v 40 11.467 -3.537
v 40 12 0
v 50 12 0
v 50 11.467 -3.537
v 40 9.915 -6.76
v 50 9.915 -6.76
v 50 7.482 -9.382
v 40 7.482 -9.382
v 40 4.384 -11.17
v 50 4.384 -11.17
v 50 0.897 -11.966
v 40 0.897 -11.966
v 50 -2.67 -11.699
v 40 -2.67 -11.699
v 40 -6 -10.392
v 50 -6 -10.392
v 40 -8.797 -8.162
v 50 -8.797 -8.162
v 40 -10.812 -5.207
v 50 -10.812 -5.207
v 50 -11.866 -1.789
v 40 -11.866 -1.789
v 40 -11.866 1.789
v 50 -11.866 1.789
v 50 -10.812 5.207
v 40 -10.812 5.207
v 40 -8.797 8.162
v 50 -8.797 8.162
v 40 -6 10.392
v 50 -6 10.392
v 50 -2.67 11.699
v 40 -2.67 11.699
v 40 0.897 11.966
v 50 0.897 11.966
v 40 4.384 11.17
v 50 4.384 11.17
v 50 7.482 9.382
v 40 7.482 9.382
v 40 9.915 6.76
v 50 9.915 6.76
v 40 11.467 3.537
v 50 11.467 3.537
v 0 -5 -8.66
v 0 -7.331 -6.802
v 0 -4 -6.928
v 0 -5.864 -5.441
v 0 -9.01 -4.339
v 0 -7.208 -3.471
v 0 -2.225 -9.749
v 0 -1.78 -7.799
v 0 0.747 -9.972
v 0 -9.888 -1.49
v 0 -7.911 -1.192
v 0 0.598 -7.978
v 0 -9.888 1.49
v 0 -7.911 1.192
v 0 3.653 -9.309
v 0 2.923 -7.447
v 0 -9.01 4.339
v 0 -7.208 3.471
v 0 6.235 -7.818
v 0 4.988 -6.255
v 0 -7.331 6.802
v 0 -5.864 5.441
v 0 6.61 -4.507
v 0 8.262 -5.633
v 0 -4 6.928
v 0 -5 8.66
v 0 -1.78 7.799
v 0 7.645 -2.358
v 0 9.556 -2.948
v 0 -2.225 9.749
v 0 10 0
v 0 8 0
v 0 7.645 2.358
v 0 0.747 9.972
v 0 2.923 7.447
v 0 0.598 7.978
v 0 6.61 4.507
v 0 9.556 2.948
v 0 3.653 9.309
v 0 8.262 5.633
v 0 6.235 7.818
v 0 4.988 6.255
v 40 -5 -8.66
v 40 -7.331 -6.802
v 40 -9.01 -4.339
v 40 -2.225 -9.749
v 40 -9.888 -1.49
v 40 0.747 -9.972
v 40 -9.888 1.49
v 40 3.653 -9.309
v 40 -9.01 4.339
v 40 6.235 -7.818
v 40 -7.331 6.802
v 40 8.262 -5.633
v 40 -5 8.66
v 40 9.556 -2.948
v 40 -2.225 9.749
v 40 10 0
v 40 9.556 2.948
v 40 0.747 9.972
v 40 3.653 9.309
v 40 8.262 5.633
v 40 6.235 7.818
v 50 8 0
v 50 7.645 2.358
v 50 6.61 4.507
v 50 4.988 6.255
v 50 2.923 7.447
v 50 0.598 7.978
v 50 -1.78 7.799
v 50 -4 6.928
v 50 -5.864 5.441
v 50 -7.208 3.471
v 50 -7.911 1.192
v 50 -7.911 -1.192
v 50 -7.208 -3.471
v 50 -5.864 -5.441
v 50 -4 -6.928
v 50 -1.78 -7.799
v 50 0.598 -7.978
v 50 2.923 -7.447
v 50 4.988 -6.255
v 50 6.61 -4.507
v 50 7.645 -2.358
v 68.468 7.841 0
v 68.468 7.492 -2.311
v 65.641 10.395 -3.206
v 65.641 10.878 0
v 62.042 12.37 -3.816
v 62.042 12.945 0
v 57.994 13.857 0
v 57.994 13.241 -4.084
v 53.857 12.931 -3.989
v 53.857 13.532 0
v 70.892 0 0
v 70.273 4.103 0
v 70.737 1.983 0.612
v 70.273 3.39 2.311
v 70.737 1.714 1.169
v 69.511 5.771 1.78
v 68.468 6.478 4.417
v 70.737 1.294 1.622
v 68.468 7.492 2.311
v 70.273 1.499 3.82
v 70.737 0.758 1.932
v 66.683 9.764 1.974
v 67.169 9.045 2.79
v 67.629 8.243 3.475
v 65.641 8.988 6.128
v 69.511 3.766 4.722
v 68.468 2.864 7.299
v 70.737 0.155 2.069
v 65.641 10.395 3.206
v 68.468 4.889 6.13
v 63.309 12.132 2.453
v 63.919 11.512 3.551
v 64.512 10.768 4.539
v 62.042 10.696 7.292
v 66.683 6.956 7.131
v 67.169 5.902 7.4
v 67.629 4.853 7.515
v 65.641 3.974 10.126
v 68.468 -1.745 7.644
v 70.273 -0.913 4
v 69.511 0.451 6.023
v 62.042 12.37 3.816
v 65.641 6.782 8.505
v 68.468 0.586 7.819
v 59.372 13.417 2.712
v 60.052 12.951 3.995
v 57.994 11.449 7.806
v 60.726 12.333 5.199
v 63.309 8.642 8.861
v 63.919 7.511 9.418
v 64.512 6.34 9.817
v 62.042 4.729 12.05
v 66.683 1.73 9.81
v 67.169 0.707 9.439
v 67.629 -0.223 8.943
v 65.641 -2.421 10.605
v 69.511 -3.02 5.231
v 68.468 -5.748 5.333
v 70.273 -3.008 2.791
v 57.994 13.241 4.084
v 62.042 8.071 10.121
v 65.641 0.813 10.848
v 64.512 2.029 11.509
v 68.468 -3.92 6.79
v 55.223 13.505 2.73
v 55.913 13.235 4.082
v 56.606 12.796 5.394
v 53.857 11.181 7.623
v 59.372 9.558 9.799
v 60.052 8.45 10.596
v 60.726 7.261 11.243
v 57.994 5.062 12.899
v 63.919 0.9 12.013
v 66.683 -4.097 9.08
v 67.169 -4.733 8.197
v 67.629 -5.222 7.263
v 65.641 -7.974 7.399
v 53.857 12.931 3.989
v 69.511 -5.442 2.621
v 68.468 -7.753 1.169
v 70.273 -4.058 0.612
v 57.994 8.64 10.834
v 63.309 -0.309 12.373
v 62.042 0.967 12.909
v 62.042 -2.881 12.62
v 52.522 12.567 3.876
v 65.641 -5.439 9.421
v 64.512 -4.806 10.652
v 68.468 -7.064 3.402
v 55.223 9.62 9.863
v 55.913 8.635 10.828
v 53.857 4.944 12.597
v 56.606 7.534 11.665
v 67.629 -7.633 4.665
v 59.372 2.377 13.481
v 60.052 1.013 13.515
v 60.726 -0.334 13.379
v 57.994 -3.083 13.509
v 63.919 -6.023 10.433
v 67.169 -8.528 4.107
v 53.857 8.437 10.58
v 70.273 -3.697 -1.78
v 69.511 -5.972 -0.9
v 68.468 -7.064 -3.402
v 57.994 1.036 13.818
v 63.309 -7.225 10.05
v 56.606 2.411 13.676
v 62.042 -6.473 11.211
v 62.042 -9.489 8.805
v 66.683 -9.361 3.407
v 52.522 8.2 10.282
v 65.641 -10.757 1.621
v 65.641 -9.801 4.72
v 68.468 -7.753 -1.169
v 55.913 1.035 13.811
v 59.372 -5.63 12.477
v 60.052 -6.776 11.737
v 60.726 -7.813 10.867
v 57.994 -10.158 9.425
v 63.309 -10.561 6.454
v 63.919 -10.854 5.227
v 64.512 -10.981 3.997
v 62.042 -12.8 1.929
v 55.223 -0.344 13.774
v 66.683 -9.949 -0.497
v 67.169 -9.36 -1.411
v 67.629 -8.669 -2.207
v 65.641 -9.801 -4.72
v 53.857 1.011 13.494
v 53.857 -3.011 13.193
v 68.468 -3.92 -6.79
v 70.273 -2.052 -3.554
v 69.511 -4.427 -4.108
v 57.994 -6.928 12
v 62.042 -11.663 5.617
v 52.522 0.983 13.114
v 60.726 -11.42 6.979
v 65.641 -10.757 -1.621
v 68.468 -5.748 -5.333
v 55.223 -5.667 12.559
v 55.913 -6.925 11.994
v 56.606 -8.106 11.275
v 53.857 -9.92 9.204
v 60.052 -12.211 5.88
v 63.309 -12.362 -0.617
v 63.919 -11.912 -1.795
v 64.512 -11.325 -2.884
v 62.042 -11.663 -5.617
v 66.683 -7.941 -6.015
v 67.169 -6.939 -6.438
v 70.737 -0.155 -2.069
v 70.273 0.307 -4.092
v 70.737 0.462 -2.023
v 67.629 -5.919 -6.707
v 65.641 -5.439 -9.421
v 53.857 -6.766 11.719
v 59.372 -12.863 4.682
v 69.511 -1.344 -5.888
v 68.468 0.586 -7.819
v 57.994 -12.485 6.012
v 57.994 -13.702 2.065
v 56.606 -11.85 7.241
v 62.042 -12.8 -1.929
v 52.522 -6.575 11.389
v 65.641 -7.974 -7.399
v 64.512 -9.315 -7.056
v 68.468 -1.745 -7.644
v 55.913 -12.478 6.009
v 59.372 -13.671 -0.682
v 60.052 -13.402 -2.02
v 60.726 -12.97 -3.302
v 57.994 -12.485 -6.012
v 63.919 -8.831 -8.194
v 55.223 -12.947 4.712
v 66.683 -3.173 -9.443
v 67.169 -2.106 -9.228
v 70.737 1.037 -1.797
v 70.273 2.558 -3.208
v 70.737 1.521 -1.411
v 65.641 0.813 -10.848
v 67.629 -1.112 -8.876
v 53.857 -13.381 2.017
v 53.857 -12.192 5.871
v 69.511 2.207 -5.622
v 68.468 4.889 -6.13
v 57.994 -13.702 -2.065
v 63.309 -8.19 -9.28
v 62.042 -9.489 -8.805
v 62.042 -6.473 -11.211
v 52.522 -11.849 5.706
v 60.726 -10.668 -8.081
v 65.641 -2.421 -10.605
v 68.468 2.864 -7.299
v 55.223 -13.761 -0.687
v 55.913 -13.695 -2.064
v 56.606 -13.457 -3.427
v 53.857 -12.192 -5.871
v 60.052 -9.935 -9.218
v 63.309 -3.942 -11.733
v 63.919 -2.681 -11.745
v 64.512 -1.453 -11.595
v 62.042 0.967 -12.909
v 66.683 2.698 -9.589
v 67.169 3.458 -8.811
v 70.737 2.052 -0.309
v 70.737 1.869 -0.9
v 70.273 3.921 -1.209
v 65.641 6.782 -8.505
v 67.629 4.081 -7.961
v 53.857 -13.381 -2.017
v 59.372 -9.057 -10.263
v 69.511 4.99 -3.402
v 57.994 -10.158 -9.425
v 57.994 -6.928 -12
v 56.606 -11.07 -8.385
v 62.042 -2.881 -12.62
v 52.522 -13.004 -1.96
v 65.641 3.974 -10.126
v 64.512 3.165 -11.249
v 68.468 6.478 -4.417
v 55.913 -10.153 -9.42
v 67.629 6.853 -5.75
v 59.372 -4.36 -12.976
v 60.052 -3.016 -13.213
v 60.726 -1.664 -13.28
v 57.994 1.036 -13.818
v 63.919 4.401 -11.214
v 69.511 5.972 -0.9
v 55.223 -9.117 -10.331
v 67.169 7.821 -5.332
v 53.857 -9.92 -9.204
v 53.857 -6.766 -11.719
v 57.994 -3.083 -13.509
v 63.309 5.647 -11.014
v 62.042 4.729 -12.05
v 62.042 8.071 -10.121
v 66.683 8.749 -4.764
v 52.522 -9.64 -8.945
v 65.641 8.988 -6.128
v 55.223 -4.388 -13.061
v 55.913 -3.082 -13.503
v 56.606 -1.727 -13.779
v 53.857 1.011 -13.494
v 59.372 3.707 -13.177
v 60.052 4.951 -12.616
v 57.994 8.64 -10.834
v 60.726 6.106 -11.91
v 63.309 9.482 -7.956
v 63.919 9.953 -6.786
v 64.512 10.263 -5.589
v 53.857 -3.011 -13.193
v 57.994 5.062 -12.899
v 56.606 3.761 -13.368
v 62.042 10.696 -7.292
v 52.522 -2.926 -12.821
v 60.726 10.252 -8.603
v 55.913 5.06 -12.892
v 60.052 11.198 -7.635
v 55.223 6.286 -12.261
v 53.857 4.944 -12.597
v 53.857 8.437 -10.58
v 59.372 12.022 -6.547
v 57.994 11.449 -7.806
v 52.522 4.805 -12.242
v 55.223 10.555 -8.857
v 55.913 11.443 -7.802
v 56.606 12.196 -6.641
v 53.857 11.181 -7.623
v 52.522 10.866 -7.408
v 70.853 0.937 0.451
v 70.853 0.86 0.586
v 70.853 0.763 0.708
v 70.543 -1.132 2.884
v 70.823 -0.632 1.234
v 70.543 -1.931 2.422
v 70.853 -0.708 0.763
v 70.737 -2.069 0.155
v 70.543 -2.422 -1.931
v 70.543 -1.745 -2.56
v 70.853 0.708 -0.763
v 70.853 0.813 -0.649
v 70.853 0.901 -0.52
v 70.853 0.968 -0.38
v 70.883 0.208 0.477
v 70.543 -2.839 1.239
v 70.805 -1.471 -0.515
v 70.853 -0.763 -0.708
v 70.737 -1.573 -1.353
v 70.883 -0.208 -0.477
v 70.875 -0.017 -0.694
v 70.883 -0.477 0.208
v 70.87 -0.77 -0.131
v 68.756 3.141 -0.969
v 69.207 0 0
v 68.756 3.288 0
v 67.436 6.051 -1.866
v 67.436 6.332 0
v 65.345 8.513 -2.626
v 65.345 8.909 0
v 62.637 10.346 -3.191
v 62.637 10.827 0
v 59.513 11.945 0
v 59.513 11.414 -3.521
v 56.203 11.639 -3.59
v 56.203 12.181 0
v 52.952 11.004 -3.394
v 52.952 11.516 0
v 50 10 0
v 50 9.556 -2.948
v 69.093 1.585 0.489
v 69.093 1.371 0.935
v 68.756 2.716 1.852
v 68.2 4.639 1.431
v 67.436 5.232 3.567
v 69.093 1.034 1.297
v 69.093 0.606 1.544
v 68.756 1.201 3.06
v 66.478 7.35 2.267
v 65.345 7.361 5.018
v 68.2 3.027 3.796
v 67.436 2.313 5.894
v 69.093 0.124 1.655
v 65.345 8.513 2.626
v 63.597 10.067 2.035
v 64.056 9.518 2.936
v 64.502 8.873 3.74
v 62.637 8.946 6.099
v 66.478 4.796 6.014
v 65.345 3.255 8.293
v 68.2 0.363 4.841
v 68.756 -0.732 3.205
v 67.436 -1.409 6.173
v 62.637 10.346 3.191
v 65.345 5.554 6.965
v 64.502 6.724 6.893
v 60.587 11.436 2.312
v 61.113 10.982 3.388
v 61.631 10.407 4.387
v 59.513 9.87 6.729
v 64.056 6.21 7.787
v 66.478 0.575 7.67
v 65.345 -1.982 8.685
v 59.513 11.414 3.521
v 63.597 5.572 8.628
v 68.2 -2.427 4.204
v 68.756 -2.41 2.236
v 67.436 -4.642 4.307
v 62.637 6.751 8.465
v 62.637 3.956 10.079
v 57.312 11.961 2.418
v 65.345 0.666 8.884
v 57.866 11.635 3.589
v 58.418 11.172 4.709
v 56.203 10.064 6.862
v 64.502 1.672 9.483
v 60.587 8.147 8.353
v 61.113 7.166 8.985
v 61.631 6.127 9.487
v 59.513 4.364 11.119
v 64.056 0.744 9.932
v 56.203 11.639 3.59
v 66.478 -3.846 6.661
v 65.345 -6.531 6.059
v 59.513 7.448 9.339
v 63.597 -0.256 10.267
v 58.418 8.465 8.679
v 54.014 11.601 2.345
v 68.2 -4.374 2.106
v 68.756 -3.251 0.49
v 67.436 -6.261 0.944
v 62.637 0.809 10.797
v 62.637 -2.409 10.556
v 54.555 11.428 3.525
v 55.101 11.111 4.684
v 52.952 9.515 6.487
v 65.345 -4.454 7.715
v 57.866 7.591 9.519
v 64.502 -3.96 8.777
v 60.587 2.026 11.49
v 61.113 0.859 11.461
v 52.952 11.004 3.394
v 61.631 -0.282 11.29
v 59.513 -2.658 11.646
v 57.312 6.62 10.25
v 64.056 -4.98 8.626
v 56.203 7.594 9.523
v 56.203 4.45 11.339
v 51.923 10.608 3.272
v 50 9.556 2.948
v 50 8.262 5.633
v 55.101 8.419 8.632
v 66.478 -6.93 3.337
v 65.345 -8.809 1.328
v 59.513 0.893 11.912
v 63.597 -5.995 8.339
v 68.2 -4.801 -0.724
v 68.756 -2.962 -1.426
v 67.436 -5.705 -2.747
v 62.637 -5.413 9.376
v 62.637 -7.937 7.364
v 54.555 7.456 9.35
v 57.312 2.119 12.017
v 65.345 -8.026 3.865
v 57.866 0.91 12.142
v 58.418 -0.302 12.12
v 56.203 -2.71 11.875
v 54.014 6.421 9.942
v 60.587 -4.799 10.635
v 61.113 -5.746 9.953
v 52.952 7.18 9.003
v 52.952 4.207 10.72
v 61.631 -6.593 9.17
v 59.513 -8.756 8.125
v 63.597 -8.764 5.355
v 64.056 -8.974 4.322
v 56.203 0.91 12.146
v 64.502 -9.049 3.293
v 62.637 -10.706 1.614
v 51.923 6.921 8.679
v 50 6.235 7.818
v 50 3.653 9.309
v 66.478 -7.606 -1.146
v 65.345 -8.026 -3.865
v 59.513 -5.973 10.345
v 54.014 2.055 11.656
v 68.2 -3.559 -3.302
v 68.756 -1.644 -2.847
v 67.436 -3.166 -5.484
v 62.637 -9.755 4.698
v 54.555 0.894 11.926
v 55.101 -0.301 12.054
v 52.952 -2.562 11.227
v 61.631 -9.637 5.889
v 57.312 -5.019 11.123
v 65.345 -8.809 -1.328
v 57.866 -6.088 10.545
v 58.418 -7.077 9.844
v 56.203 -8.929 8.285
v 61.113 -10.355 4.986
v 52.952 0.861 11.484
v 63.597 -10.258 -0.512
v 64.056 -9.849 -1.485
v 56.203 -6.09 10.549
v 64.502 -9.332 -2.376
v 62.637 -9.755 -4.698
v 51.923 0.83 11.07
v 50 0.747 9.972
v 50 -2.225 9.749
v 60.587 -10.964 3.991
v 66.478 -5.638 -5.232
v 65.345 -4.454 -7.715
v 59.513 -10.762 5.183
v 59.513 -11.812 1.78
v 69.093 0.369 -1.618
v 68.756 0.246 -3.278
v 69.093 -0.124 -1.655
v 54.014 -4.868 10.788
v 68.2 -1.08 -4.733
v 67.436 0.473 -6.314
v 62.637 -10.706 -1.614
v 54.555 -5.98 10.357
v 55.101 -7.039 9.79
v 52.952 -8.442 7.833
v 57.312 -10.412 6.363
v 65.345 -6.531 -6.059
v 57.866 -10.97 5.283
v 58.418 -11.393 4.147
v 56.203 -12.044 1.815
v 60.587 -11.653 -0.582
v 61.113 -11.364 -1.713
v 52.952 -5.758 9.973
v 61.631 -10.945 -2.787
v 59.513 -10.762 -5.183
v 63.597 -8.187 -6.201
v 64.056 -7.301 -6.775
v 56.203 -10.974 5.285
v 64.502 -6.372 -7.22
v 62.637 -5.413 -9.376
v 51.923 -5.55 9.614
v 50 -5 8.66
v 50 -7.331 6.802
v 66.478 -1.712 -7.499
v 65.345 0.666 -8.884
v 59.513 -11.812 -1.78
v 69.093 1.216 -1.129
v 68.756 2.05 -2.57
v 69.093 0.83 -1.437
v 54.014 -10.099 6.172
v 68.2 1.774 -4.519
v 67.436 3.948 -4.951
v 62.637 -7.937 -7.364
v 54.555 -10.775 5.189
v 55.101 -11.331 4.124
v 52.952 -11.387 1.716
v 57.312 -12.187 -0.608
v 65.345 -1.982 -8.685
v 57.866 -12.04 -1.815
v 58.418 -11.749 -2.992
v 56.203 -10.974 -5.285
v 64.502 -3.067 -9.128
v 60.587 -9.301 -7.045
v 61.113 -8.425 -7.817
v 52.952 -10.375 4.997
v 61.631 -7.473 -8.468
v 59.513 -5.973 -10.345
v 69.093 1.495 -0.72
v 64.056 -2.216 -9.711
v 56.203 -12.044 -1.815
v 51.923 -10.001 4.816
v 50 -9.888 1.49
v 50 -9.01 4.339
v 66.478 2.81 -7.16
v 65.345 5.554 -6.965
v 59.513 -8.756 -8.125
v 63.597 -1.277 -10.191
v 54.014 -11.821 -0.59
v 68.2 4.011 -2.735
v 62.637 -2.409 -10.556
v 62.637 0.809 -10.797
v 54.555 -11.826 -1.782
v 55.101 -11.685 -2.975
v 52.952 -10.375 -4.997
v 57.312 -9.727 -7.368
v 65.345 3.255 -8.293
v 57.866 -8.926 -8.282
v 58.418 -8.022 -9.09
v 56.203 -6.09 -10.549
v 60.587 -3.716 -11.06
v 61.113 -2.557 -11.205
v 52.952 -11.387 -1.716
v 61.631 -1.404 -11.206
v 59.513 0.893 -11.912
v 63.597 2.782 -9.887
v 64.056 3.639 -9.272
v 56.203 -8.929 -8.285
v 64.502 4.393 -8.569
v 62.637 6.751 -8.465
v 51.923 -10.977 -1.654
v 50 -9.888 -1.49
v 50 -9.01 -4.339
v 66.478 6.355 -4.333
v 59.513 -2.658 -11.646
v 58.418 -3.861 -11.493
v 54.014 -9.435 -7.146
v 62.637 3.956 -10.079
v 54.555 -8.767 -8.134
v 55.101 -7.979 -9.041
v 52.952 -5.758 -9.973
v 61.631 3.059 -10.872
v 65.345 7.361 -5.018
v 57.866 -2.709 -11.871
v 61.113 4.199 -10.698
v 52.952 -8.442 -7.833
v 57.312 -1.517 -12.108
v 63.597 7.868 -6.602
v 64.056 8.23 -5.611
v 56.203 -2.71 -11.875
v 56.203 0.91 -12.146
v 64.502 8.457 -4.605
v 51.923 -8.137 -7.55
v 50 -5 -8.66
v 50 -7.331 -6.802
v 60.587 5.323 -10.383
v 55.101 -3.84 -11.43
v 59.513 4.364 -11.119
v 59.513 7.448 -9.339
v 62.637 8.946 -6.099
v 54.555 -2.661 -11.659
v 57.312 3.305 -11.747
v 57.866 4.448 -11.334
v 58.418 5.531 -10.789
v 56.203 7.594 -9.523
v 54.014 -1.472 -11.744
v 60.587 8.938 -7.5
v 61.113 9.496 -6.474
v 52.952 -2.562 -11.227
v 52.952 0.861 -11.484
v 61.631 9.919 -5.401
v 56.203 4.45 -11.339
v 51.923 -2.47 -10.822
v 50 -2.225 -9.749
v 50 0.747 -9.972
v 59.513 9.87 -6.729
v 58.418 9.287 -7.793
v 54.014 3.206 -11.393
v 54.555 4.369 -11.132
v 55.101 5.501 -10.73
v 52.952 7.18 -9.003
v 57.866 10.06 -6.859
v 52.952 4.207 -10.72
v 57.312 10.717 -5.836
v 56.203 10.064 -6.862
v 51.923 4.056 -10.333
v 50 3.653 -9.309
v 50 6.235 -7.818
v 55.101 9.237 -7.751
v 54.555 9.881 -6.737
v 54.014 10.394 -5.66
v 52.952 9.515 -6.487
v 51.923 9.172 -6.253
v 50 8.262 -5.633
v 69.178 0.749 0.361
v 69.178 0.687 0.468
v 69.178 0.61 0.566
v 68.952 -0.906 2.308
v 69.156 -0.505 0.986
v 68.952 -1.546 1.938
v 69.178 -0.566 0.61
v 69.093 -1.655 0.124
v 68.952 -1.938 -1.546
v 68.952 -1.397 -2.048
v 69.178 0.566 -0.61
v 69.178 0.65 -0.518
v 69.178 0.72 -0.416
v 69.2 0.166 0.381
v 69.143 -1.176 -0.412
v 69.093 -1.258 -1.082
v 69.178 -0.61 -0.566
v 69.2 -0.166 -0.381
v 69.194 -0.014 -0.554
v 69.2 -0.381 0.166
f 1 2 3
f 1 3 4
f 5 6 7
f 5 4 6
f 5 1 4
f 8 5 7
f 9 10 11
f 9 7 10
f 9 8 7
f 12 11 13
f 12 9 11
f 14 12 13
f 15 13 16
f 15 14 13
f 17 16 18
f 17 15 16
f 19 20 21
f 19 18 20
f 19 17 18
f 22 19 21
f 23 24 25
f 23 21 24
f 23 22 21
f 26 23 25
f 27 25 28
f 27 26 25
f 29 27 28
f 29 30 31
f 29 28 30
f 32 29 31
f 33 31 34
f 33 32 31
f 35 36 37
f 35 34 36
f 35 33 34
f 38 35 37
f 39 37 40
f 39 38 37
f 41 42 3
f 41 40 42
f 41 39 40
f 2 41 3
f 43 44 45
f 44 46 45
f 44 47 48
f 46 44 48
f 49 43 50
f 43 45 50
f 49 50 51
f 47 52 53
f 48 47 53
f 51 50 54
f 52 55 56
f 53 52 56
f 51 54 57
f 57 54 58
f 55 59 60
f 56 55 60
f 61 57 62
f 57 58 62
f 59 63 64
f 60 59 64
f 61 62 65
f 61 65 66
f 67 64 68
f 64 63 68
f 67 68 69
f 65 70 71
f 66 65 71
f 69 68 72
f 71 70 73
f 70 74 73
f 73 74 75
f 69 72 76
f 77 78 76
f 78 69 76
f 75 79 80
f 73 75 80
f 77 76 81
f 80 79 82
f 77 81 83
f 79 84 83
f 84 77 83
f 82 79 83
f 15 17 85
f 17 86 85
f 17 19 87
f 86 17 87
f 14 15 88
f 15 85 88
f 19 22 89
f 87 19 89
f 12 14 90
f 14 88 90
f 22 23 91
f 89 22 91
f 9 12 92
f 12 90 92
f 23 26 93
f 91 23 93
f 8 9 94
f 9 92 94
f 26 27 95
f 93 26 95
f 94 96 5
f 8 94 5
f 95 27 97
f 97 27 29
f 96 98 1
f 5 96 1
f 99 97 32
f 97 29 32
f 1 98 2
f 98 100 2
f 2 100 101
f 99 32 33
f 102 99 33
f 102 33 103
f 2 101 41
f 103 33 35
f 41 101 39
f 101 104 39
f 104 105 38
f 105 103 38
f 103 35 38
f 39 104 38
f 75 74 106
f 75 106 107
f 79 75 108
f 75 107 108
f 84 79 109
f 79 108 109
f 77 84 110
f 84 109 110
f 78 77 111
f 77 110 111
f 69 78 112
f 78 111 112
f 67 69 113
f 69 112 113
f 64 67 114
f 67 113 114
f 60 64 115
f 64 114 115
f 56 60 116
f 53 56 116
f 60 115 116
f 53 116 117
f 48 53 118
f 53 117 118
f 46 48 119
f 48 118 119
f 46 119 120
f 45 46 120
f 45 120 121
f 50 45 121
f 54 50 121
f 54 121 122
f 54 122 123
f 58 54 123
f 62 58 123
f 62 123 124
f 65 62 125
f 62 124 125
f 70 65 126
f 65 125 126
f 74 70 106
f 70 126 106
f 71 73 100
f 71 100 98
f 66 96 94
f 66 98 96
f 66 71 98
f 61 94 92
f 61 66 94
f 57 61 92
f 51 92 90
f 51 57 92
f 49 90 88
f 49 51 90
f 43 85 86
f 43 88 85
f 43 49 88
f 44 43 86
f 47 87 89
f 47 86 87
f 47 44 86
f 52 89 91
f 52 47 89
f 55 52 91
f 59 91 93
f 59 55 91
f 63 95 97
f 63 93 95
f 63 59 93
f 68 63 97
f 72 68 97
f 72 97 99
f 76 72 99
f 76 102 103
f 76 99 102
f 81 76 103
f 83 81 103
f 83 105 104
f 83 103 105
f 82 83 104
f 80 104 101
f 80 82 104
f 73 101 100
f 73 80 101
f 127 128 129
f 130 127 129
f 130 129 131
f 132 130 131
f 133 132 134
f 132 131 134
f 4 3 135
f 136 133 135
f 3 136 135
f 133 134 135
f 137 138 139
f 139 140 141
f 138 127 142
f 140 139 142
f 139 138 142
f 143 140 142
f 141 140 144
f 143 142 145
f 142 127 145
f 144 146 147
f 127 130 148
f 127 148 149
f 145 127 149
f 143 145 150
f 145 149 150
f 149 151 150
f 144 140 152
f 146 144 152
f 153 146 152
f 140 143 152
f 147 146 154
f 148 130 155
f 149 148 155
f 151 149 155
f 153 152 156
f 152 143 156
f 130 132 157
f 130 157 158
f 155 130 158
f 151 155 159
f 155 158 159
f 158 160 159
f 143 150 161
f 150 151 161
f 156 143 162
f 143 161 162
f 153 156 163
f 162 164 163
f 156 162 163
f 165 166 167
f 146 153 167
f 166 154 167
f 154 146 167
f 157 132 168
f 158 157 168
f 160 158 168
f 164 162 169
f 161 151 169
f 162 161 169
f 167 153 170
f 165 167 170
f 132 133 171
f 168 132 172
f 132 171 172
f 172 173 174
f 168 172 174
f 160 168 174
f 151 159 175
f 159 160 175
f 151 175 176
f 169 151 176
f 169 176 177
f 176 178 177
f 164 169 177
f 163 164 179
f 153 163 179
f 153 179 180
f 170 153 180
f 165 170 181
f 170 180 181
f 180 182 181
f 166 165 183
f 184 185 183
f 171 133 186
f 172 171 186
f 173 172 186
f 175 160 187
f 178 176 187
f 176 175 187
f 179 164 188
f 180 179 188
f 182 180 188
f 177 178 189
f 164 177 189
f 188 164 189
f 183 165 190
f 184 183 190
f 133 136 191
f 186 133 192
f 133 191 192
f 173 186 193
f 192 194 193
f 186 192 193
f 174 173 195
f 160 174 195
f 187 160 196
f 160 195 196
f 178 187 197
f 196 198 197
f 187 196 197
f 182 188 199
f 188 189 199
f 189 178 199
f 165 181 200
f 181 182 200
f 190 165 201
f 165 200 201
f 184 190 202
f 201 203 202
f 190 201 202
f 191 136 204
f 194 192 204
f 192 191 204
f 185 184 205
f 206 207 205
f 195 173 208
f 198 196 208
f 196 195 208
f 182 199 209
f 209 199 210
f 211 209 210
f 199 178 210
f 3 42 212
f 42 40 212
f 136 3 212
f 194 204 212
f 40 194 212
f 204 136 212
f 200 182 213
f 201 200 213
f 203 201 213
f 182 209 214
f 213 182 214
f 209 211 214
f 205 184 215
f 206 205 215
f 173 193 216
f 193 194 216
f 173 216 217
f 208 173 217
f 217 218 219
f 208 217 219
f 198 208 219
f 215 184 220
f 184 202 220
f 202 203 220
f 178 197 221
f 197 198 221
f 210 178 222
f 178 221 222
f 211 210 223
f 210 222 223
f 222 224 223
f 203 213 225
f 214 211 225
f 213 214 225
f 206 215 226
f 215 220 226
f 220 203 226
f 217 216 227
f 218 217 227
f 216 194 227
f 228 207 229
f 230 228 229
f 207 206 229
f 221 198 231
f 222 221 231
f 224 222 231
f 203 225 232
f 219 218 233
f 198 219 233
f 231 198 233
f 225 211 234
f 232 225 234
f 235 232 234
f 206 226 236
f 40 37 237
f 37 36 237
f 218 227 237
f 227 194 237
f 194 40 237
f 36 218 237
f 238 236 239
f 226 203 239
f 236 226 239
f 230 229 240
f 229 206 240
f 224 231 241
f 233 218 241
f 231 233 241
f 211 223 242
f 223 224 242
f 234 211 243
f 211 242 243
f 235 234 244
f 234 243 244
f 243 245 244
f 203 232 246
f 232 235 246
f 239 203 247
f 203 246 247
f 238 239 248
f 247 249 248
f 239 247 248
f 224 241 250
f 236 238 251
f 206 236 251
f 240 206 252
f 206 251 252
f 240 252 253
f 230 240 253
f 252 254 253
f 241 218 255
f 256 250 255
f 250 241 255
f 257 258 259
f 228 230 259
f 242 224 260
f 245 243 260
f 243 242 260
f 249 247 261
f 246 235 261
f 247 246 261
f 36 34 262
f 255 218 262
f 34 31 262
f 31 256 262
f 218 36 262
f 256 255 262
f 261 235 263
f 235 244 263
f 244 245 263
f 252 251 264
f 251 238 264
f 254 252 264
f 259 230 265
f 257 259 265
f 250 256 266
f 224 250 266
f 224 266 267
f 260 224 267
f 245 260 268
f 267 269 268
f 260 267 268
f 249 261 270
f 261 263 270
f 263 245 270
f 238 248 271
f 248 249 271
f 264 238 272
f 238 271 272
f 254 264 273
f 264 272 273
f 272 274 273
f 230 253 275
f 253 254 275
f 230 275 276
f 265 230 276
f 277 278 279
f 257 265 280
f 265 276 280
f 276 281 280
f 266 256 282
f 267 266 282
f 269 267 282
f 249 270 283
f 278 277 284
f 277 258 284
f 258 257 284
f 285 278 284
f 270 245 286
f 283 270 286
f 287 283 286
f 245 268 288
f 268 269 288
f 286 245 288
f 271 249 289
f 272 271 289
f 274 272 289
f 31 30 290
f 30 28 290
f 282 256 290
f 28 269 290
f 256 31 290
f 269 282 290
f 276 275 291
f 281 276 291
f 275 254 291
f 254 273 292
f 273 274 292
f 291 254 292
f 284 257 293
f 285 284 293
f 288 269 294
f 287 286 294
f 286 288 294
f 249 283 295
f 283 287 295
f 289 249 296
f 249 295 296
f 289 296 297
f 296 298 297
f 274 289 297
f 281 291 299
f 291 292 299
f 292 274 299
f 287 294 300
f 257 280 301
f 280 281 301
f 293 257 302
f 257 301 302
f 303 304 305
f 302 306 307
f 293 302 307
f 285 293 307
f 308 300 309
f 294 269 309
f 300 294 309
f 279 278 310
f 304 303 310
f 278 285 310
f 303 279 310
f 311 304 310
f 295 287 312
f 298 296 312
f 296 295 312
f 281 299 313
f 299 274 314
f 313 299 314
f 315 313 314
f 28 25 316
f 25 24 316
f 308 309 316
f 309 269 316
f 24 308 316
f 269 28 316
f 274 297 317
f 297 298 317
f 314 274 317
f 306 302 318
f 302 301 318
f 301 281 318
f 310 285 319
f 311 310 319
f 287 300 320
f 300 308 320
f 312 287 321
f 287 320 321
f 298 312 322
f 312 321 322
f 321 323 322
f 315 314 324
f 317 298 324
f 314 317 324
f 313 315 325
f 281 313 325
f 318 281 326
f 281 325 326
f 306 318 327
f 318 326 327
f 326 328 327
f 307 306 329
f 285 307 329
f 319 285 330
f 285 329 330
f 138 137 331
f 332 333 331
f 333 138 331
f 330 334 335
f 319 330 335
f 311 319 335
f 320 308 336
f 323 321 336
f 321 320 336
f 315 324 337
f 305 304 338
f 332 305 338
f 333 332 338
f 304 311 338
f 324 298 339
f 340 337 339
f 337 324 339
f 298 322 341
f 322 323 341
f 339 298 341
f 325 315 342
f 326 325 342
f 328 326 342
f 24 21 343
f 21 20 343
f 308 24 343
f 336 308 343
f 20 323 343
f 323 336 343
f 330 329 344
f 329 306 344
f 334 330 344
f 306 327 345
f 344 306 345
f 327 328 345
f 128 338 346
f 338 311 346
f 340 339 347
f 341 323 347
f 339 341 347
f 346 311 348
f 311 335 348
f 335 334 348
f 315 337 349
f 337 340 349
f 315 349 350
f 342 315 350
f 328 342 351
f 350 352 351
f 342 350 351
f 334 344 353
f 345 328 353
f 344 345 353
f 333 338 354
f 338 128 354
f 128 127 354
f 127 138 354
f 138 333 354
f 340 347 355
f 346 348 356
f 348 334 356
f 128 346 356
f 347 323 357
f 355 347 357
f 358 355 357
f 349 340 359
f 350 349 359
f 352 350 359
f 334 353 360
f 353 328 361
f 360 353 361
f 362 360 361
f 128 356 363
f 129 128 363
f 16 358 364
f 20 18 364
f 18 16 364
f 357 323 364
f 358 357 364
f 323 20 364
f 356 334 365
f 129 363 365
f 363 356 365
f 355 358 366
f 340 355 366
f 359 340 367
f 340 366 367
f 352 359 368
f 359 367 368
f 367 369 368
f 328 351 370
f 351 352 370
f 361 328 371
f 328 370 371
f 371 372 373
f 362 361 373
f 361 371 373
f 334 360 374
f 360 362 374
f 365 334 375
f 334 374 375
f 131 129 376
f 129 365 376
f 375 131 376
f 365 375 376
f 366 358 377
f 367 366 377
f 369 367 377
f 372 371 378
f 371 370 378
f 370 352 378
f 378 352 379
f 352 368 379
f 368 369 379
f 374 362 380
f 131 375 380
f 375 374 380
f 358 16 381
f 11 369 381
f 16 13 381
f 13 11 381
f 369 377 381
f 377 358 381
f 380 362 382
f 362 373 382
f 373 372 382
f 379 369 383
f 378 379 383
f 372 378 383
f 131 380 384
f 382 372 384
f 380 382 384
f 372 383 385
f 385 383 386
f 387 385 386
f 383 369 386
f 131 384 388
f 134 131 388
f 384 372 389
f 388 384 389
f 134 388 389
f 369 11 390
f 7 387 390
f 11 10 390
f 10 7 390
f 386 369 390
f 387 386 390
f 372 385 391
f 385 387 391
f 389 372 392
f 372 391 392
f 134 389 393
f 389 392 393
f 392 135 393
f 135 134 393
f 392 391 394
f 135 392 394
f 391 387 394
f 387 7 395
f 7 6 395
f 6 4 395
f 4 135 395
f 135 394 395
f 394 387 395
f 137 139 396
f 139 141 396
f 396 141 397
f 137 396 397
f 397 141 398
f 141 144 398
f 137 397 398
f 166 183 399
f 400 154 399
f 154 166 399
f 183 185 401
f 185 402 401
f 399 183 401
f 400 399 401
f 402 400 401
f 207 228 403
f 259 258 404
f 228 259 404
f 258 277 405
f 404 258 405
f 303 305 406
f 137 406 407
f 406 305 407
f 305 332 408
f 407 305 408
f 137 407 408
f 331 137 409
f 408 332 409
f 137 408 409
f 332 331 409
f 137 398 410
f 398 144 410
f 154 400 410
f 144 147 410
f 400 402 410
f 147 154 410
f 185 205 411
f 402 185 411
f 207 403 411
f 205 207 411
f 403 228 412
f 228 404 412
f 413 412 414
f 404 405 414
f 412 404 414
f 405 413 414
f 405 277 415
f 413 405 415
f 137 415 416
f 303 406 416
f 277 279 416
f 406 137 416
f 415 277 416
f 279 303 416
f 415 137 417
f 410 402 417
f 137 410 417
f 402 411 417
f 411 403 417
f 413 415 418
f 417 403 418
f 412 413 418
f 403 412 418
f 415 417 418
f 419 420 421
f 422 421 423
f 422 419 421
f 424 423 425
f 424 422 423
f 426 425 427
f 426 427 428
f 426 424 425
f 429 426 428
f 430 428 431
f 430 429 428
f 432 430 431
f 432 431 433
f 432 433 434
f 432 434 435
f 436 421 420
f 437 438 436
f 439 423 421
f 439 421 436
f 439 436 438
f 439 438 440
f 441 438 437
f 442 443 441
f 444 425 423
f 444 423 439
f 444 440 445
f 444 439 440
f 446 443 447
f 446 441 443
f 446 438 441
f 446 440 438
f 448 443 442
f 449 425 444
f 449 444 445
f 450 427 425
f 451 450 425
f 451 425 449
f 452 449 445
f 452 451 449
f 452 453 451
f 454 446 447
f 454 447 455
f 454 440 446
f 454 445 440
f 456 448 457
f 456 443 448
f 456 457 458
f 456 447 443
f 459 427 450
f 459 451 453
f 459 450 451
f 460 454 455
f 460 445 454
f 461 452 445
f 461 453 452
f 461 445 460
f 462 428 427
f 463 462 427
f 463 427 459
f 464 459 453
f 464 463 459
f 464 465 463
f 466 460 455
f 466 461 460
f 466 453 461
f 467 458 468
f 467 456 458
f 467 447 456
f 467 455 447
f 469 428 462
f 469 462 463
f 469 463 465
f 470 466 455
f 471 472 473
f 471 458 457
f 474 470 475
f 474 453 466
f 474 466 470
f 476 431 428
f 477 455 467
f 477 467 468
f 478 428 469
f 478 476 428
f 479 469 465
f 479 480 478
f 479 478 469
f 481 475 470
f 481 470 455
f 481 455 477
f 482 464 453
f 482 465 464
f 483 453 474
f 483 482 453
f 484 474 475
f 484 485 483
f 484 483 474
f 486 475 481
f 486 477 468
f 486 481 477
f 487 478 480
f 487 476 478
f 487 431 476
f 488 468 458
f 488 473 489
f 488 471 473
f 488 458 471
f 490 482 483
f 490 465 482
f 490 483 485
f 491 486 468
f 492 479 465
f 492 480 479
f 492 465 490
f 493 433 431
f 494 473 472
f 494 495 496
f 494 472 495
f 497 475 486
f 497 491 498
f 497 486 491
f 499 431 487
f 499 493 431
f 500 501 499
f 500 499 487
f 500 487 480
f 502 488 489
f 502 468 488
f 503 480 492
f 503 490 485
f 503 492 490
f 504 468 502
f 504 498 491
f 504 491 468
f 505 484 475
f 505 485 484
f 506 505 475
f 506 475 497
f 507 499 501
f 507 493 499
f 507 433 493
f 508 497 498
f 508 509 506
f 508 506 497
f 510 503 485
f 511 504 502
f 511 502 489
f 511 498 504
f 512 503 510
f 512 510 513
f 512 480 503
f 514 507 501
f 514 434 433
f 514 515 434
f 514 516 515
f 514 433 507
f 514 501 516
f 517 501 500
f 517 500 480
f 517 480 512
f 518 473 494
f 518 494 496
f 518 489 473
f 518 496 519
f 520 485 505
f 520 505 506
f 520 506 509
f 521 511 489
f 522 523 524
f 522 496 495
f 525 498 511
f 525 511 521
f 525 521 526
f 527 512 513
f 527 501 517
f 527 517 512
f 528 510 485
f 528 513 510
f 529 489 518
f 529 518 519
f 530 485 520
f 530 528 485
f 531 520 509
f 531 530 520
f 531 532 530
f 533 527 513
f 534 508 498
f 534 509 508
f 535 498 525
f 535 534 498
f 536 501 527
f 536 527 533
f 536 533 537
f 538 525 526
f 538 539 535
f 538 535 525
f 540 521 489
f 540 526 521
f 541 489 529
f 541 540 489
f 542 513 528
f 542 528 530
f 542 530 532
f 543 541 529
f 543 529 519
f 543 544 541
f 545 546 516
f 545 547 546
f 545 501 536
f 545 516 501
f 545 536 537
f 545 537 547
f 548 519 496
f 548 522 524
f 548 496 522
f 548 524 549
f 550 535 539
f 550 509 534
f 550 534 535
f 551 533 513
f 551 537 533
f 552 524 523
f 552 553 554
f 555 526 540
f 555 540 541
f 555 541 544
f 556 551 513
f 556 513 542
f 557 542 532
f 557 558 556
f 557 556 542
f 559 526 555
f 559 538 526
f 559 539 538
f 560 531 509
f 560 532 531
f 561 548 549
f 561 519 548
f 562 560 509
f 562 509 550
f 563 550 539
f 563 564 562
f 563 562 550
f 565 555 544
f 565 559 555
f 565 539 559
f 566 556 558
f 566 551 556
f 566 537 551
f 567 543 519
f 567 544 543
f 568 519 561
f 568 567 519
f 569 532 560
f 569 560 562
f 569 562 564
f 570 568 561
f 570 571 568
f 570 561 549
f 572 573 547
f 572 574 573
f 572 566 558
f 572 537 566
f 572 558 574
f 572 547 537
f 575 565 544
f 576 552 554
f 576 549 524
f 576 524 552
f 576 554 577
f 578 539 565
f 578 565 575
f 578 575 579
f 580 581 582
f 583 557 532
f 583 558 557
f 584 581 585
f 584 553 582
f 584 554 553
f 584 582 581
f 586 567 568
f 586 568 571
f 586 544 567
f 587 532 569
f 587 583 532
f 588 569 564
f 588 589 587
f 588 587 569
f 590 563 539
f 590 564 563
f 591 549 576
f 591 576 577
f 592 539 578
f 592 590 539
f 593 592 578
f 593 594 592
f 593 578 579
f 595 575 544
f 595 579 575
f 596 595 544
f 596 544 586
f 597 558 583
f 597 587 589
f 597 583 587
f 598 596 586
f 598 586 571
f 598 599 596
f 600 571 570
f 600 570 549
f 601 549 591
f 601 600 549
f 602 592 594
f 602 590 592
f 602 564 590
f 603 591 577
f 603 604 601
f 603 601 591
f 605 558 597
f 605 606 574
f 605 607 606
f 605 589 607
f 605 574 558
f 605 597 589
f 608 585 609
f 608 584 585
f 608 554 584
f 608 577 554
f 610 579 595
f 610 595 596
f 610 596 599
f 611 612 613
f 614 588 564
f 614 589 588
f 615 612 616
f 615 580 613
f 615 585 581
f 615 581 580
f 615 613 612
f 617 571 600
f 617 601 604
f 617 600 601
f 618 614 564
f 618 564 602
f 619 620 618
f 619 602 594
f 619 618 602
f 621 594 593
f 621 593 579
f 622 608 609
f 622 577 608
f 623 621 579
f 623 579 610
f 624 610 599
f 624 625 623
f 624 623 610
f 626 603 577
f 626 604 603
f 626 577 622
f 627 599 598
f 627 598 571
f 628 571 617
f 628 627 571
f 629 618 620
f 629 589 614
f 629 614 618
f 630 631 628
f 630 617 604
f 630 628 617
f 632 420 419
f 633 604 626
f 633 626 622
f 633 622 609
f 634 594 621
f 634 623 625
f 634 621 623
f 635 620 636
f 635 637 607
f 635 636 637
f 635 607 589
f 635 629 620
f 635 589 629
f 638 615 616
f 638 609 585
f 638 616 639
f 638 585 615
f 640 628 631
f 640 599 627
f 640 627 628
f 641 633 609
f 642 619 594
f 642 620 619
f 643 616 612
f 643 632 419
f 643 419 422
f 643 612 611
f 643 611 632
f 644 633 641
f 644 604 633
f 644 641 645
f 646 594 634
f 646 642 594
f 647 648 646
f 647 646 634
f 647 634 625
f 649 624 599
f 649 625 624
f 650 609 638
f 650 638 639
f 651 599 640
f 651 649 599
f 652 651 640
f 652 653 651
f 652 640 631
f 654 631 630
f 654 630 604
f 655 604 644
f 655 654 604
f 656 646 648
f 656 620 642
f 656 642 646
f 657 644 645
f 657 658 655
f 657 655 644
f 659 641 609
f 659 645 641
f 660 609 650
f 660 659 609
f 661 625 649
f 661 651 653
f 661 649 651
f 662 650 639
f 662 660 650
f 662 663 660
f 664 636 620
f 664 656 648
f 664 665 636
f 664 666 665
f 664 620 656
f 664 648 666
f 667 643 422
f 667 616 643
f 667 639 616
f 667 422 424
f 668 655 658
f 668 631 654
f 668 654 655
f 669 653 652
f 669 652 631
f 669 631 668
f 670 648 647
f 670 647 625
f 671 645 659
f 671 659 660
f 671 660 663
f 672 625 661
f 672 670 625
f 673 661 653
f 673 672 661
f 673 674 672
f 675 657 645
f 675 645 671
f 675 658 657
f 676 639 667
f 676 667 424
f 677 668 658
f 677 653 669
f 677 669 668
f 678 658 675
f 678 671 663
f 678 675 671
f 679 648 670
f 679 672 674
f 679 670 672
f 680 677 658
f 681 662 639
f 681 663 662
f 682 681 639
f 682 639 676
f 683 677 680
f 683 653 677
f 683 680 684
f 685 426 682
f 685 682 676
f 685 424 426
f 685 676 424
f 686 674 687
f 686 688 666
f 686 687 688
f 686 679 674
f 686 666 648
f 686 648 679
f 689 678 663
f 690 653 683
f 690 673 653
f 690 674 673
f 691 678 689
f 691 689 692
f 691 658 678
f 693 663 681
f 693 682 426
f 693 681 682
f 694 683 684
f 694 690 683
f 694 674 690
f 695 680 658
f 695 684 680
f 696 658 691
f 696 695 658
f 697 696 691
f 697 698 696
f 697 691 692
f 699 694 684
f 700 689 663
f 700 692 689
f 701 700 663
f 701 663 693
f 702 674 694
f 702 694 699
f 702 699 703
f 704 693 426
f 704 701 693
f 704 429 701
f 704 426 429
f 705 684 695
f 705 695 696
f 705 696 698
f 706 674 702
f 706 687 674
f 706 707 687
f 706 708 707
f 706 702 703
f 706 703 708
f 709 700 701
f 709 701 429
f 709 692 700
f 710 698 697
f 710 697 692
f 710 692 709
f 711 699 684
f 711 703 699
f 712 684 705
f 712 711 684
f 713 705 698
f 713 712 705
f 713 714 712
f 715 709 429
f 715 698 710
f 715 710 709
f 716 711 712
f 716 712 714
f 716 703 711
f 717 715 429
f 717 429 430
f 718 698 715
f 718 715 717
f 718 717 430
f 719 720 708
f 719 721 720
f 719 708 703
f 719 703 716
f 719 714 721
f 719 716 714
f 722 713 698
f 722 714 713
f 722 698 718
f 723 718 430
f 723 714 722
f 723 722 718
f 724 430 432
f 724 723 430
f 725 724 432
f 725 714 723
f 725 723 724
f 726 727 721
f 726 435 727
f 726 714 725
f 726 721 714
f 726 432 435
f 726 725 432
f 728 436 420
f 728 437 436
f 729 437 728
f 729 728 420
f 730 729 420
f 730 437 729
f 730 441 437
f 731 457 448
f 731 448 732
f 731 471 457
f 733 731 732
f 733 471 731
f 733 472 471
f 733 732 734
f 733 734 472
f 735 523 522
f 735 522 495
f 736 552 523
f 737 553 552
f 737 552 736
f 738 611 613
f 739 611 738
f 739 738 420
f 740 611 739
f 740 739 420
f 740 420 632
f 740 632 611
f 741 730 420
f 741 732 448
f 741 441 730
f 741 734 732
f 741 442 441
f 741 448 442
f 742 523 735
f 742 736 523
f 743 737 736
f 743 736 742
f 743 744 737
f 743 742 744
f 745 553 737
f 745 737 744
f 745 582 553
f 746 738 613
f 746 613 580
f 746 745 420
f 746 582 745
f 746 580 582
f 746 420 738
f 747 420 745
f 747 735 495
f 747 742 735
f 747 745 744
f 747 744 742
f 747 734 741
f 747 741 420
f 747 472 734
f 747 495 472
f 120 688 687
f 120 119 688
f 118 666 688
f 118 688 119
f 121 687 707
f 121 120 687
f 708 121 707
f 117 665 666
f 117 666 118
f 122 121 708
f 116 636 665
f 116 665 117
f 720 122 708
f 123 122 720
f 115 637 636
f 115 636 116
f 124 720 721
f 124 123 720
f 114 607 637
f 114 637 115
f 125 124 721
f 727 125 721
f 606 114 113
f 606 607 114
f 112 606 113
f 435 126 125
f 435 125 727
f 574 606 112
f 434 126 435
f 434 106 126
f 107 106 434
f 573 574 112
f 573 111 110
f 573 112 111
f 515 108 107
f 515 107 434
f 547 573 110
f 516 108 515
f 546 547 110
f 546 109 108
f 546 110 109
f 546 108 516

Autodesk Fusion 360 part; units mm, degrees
sketch "Sketch1" plane through (0, 0, 0) normal (0, 0, 1) x (1, 0, 0)
  line L0 (0, 0) -> (50, 0)
  line L1 (50, 8) -> (50, 10)
  line L2 (40, 10) -> (0, 10)
  line L3 (0, 10) -> (0, 0)
  line L4 (50, 10) -> (40, 10) construction
  line L5 (50, 10) -> (50, 12)
  line L6 (50, 12) -> (40, 12)
  line L7 (40, 12) -> (40, 10)
  line L8 (50, 0) -> (57, 0) construction
  arc A0 (70.8924, 0) -> (50, 12) centre (57, 0) ccw
  arc A1 (69.2066, 0) -> (50, 10) centre (57, 0) ccw
  line L9 (50, 0) -> (70.8924, 0)
  line L10 (0, 0) -> (0, 8) construction
  line L11 (0, 8) -> (50, 8)
  line L12 (50, 8) -> (50, 10)
  dimension "d1" = 50
  dimension "d2" = 10
  dimension "d3" = 10
  dimension "d4" = 10
  dimension "d5" = 2
  dimension "d6" = 7
  dimension "d7" = 8
  dimension "d8" = 50
revolve "Revolve1" add sketch "Sketch1" angle 360 about axis through (0, 0, 0) along (1, 0, 0) contours L1 L2 L3 L5 L6 L7 L11 L12 | L5 A0 A1 L9
